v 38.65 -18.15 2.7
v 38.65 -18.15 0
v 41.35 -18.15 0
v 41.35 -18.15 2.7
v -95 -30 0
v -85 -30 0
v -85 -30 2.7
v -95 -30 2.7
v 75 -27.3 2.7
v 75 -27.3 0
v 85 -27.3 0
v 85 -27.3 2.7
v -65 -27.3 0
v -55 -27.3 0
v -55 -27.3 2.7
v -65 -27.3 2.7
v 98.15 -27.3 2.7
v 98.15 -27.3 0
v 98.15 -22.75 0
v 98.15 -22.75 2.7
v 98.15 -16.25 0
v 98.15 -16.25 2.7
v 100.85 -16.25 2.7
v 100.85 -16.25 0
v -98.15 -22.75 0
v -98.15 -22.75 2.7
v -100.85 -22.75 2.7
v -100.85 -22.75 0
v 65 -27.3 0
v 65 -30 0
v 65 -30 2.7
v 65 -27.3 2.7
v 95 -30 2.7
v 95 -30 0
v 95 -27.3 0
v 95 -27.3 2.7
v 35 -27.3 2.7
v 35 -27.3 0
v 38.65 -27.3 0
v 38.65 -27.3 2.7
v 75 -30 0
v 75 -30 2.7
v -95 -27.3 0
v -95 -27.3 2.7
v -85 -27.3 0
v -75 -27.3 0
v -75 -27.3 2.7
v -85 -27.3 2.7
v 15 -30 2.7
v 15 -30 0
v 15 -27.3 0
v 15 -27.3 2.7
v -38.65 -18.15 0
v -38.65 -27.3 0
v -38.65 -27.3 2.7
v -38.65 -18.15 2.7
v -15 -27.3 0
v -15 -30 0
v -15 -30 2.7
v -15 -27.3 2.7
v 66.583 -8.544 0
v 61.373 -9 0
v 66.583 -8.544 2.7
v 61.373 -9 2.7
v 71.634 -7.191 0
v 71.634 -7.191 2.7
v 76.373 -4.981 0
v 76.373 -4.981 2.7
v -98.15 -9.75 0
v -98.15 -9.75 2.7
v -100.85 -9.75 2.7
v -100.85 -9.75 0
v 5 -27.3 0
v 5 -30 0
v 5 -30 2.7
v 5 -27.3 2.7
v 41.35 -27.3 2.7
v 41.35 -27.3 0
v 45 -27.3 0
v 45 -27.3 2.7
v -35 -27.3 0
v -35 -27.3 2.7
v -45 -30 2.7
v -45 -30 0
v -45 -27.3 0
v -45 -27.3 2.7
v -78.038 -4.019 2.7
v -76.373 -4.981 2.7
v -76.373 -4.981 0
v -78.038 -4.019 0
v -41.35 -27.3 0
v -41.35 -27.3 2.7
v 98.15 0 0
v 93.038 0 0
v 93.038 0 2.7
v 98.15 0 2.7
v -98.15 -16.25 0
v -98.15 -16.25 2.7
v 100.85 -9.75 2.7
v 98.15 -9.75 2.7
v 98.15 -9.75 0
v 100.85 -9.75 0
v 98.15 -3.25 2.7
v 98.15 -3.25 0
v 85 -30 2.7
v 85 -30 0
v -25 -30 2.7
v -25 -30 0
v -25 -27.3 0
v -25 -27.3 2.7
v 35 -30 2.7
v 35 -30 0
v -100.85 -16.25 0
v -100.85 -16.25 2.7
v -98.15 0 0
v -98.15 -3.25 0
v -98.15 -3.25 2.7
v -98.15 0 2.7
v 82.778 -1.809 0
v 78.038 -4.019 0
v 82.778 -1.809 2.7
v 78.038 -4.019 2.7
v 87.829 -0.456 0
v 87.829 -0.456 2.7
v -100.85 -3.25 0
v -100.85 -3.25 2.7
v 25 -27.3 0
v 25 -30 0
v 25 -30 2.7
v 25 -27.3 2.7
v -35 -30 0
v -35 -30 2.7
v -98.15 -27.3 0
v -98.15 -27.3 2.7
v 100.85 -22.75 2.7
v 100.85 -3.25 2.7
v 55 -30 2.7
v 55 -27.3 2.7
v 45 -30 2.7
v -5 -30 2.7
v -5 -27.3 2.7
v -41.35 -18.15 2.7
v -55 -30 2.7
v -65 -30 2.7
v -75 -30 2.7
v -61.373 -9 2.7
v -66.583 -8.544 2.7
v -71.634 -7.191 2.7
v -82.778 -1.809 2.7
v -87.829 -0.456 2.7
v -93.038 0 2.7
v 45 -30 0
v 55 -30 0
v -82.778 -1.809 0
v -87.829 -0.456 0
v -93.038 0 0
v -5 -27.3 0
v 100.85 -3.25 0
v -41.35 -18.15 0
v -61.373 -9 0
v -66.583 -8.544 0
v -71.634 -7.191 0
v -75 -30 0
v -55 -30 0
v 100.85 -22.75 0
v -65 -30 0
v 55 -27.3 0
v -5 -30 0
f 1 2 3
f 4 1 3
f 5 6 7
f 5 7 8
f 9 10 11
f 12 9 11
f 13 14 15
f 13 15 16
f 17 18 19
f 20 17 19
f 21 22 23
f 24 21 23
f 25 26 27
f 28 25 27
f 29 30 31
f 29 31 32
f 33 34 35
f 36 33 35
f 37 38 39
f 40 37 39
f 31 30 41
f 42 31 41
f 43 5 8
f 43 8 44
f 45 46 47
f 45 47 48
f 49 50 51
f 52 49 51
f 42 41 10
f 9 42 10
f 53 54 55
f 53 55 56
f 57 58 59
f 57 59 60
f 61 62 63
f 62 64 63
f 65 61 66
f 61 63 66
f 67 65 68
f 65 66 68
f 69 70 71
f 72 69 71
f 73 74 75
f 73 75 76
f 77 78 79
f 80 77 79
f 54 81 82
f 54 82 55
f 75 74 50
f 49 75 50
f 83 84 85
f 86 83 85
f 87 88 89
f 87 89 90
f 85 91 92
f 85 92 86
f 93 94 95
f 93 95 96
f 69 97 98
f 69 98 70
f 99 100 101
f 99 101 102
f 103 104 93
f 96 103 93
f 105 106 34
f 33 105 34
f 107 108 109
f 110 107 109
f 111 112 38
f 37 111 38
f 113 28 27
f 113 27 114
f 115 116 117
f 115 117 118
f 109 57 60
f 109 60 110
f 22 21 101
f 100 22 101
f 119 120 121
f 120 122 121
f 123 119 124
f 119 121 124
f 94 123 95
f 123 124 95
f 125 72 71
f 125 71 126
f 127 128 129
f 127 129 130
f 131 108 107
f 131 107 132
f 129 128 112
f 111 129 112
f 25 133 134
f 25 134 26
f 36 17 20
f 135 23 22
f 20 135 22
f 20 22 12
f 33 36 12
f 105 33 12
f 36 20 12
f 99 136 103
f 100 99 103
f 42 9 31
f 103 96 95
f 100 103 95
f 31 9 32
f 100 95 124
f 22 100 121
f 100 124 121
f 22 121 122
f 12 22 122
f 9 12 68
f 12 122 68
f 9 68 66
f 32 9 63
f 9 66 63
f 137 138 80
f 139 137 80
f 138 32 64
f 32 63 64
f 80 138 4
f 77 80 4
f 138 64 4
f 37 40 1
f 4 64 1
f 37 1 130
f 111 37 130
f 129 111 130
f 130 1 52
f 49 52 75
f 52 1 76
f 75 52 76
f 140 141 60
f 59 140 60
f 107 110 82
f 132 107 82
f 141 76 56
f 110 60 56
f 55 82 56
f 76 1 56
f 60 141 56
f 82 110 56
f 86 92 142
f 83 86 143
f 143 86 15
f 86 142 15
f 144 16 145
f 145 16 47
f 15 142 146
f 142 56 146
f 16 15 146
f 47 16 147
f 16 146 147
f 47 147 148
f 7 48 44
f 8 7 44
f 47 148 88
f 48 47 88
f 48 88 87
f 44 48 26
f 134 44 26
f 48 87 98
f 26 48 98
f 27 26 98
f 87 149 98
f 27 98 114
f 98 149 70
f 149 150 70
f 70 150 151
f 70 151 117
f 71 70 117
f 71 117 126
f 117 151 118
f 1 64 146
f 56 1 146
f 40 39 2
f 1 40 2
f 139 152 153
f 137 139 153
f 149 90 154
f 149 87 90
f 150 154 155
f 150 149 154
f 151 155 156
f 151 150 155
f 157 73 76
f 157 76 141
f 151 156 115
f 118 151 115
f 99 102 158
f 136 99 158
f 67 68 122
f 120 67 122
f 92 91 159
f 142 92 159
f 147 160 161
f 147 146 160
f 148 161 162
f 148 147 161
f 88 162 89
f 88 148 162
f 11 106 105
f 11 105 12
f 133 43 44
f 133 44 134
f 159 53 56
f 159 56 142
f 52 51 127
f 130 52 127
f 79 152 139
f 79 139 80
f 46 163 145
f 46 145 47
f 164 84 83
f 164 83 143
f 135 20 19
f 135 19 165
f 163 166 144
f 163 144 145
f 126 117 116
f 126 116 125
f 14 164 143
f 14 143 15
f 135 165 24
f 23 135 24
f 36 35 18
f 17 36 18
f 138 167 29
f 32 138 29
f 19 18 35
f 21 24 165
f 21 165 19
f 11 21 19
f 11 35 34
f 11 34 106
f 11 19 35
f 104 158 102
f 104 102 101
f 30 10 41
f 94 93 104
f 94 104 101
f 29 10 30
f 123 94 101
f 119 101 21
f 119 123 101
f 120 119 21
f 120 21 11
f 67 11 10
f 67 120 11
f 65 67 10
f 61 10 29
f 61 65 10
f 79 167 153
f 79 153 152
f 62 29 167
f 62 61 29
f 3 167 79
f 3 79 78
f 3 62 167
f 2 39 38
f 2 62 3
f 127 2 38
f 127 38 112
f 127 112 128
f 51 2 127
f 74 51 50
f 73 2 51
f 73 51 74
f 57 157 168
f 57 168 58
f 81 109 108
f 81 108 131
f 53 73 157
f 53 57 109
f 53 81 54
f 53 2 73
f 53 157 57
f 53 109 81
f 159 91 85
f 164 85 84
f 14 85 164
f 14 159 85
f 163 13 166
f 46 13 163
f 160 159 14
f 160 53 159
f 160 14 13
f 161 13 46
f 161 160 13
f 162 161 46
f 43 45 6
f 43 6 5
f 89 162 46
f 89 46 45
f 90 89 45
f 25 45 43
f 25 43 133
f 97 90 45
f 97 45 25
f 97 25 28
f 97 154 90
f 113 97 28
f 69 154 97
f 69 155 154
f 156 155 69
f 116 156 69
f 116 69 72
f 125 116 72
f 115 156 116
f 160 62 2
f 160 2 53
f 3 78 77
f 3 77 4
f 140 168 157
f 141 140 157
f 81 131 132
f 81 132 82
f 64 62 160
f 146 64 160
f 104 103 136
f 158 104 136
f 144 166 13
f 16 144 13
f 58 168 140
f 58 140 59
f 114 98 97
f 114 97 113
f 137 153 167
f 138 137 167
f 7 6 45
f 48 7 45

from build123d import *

# Parameters (mm, degrees)
ESQUISSE1_W                = 98.15
ESQUISSE1_H                = 27.3
BOSS_EXTRU_1_DEPTH         = 2.7
ESQUISSE2_W                = 10
ESQUISSE2_H                = 2.7
BOSS_EXTRU_2_DEPTH         = 2.7
R_P_TITION_LIN_AIRE1_COUNT = 5
R_P_TITION_LIN_AIRE1_PITCH = 20
ESQUISSE3_W                = 2.7
ESQUISSE3_H                = 6.5
BOSS_EXTRU_3_DEPTH         = 2.7
R_P_TITION_LIN_AIRE2_COUNT = 2
R_P_TITION_LIN_AIRE2_PITCH = 13
ENL_V_MAT_EXTRU_1_DEPTH    = 2.7
CONG_1_R                   = 30
ESQUISSE5_W                = 2.7
ESQUISSE5_H                = 9.15
ENL_V_MAT_EXTRU_2_DEPTH    = 2.7


with BuildPart() as part:
    # Esquisse1 → Boss.-Extru.1 (new body)
    with BuildSketch(Plane.XY):
        with Locations((49.075, -13.65)):
            Rectangle(ESQUISSE1_W, ESQUISSE1_H)
    extrude(amount=BOSS_EXTRU_1_DEPTH)

    # Esquisse2 → Boss.-Extru.2 (add)
    with BuildSketch(Plane.XY):
        with Locations((10, -28.65)):
            Rectangle(ESQUISSE2_W, ESQUISSE2_H)
    boss_extru_2 = extrude(amount=BOSS_EXTRU_2_DEPTH)

    # Répétition linéaire1: Boss.-Extru.2 ×5
    with Locations(*[(i * R_P_TITION_LIN_AIRE1_PITCH, 0, 0) for i in range(1, R_P_TITION_LIN_AIRE1_COUNT)]):
        add(boss_extru_2)

    # Esquisse3 → Boss.-Extru.3 (add)
    with BuildSketch(Plane.XY):
        with Locations((99.5, -6.5)):
            Rectangle(ESQUISSE3_W, ESQUISSE3_H)
    boss_extru_3 = extrude(amount=BOSS_EXTRU_3_DEPTH)

    # Répétition linéaire2: Boss.-Extru.3 ×2
    with Locations(*[(0, -i * R_P_TITION_LIN_AIRE2_PITCH, 0) for i in range(1, R_P_TITION_LIN_AIRE2_COUNT)]):
        add(boss_extru_3)

    # Esquisse4 → Enlèv. mat.-Extru.1 (cut)
    with BuildSketch(Plane.XY):
        Polygon((0, -9), (69.411542732, -9), (85, 0), (0, 0), align=None)
    extrude(amount=ENL_V_MAT_EXTRU_1_DEPTH, mode=Mode.SUBTRACT)

    # Congé1
    cong_1_edges = [part.edges().sort_by_distance(p)[0] for p in [
        (69.411542732, -9, 1.35),
        (85, 0, 1.35),
    ]]
    fillet(cong_1_edges, radius=CONG_1_R)

    # Symétrie1: part across plane


with BuildPart() as part_1:
    add(part.part)
    add(part.part.mirror(Plane(origin=(0, 0, 0), x_dir=(0, 0, 1), z_dir=(1, 0, 0))))

    # Esquisse5 → Enlèv. mat.-Extru.2 (cut)
    with BuildSketch(Plane.XY):
        with Locations((40, -22.725)):
            Rectangle(ESQUISSE5_W, ESQUISSE5_H)
    enl_v_mat_extru_2 = extrude(amount=ENL_V_MAT_EXTRU_2_DEPTH, mode=Mode.SUBTRACT)

    # Symétrie2: Enlèv. mat.-Extru.2 across plane
    add(enl_v_mat_extru_2.mirror(Plane(origin=(0, 0, 0), x_dir=(0, 0, 1), z_dir=(1, 0, 0))), mode=Mode.SUBTRACT)


solid = part_1.part
